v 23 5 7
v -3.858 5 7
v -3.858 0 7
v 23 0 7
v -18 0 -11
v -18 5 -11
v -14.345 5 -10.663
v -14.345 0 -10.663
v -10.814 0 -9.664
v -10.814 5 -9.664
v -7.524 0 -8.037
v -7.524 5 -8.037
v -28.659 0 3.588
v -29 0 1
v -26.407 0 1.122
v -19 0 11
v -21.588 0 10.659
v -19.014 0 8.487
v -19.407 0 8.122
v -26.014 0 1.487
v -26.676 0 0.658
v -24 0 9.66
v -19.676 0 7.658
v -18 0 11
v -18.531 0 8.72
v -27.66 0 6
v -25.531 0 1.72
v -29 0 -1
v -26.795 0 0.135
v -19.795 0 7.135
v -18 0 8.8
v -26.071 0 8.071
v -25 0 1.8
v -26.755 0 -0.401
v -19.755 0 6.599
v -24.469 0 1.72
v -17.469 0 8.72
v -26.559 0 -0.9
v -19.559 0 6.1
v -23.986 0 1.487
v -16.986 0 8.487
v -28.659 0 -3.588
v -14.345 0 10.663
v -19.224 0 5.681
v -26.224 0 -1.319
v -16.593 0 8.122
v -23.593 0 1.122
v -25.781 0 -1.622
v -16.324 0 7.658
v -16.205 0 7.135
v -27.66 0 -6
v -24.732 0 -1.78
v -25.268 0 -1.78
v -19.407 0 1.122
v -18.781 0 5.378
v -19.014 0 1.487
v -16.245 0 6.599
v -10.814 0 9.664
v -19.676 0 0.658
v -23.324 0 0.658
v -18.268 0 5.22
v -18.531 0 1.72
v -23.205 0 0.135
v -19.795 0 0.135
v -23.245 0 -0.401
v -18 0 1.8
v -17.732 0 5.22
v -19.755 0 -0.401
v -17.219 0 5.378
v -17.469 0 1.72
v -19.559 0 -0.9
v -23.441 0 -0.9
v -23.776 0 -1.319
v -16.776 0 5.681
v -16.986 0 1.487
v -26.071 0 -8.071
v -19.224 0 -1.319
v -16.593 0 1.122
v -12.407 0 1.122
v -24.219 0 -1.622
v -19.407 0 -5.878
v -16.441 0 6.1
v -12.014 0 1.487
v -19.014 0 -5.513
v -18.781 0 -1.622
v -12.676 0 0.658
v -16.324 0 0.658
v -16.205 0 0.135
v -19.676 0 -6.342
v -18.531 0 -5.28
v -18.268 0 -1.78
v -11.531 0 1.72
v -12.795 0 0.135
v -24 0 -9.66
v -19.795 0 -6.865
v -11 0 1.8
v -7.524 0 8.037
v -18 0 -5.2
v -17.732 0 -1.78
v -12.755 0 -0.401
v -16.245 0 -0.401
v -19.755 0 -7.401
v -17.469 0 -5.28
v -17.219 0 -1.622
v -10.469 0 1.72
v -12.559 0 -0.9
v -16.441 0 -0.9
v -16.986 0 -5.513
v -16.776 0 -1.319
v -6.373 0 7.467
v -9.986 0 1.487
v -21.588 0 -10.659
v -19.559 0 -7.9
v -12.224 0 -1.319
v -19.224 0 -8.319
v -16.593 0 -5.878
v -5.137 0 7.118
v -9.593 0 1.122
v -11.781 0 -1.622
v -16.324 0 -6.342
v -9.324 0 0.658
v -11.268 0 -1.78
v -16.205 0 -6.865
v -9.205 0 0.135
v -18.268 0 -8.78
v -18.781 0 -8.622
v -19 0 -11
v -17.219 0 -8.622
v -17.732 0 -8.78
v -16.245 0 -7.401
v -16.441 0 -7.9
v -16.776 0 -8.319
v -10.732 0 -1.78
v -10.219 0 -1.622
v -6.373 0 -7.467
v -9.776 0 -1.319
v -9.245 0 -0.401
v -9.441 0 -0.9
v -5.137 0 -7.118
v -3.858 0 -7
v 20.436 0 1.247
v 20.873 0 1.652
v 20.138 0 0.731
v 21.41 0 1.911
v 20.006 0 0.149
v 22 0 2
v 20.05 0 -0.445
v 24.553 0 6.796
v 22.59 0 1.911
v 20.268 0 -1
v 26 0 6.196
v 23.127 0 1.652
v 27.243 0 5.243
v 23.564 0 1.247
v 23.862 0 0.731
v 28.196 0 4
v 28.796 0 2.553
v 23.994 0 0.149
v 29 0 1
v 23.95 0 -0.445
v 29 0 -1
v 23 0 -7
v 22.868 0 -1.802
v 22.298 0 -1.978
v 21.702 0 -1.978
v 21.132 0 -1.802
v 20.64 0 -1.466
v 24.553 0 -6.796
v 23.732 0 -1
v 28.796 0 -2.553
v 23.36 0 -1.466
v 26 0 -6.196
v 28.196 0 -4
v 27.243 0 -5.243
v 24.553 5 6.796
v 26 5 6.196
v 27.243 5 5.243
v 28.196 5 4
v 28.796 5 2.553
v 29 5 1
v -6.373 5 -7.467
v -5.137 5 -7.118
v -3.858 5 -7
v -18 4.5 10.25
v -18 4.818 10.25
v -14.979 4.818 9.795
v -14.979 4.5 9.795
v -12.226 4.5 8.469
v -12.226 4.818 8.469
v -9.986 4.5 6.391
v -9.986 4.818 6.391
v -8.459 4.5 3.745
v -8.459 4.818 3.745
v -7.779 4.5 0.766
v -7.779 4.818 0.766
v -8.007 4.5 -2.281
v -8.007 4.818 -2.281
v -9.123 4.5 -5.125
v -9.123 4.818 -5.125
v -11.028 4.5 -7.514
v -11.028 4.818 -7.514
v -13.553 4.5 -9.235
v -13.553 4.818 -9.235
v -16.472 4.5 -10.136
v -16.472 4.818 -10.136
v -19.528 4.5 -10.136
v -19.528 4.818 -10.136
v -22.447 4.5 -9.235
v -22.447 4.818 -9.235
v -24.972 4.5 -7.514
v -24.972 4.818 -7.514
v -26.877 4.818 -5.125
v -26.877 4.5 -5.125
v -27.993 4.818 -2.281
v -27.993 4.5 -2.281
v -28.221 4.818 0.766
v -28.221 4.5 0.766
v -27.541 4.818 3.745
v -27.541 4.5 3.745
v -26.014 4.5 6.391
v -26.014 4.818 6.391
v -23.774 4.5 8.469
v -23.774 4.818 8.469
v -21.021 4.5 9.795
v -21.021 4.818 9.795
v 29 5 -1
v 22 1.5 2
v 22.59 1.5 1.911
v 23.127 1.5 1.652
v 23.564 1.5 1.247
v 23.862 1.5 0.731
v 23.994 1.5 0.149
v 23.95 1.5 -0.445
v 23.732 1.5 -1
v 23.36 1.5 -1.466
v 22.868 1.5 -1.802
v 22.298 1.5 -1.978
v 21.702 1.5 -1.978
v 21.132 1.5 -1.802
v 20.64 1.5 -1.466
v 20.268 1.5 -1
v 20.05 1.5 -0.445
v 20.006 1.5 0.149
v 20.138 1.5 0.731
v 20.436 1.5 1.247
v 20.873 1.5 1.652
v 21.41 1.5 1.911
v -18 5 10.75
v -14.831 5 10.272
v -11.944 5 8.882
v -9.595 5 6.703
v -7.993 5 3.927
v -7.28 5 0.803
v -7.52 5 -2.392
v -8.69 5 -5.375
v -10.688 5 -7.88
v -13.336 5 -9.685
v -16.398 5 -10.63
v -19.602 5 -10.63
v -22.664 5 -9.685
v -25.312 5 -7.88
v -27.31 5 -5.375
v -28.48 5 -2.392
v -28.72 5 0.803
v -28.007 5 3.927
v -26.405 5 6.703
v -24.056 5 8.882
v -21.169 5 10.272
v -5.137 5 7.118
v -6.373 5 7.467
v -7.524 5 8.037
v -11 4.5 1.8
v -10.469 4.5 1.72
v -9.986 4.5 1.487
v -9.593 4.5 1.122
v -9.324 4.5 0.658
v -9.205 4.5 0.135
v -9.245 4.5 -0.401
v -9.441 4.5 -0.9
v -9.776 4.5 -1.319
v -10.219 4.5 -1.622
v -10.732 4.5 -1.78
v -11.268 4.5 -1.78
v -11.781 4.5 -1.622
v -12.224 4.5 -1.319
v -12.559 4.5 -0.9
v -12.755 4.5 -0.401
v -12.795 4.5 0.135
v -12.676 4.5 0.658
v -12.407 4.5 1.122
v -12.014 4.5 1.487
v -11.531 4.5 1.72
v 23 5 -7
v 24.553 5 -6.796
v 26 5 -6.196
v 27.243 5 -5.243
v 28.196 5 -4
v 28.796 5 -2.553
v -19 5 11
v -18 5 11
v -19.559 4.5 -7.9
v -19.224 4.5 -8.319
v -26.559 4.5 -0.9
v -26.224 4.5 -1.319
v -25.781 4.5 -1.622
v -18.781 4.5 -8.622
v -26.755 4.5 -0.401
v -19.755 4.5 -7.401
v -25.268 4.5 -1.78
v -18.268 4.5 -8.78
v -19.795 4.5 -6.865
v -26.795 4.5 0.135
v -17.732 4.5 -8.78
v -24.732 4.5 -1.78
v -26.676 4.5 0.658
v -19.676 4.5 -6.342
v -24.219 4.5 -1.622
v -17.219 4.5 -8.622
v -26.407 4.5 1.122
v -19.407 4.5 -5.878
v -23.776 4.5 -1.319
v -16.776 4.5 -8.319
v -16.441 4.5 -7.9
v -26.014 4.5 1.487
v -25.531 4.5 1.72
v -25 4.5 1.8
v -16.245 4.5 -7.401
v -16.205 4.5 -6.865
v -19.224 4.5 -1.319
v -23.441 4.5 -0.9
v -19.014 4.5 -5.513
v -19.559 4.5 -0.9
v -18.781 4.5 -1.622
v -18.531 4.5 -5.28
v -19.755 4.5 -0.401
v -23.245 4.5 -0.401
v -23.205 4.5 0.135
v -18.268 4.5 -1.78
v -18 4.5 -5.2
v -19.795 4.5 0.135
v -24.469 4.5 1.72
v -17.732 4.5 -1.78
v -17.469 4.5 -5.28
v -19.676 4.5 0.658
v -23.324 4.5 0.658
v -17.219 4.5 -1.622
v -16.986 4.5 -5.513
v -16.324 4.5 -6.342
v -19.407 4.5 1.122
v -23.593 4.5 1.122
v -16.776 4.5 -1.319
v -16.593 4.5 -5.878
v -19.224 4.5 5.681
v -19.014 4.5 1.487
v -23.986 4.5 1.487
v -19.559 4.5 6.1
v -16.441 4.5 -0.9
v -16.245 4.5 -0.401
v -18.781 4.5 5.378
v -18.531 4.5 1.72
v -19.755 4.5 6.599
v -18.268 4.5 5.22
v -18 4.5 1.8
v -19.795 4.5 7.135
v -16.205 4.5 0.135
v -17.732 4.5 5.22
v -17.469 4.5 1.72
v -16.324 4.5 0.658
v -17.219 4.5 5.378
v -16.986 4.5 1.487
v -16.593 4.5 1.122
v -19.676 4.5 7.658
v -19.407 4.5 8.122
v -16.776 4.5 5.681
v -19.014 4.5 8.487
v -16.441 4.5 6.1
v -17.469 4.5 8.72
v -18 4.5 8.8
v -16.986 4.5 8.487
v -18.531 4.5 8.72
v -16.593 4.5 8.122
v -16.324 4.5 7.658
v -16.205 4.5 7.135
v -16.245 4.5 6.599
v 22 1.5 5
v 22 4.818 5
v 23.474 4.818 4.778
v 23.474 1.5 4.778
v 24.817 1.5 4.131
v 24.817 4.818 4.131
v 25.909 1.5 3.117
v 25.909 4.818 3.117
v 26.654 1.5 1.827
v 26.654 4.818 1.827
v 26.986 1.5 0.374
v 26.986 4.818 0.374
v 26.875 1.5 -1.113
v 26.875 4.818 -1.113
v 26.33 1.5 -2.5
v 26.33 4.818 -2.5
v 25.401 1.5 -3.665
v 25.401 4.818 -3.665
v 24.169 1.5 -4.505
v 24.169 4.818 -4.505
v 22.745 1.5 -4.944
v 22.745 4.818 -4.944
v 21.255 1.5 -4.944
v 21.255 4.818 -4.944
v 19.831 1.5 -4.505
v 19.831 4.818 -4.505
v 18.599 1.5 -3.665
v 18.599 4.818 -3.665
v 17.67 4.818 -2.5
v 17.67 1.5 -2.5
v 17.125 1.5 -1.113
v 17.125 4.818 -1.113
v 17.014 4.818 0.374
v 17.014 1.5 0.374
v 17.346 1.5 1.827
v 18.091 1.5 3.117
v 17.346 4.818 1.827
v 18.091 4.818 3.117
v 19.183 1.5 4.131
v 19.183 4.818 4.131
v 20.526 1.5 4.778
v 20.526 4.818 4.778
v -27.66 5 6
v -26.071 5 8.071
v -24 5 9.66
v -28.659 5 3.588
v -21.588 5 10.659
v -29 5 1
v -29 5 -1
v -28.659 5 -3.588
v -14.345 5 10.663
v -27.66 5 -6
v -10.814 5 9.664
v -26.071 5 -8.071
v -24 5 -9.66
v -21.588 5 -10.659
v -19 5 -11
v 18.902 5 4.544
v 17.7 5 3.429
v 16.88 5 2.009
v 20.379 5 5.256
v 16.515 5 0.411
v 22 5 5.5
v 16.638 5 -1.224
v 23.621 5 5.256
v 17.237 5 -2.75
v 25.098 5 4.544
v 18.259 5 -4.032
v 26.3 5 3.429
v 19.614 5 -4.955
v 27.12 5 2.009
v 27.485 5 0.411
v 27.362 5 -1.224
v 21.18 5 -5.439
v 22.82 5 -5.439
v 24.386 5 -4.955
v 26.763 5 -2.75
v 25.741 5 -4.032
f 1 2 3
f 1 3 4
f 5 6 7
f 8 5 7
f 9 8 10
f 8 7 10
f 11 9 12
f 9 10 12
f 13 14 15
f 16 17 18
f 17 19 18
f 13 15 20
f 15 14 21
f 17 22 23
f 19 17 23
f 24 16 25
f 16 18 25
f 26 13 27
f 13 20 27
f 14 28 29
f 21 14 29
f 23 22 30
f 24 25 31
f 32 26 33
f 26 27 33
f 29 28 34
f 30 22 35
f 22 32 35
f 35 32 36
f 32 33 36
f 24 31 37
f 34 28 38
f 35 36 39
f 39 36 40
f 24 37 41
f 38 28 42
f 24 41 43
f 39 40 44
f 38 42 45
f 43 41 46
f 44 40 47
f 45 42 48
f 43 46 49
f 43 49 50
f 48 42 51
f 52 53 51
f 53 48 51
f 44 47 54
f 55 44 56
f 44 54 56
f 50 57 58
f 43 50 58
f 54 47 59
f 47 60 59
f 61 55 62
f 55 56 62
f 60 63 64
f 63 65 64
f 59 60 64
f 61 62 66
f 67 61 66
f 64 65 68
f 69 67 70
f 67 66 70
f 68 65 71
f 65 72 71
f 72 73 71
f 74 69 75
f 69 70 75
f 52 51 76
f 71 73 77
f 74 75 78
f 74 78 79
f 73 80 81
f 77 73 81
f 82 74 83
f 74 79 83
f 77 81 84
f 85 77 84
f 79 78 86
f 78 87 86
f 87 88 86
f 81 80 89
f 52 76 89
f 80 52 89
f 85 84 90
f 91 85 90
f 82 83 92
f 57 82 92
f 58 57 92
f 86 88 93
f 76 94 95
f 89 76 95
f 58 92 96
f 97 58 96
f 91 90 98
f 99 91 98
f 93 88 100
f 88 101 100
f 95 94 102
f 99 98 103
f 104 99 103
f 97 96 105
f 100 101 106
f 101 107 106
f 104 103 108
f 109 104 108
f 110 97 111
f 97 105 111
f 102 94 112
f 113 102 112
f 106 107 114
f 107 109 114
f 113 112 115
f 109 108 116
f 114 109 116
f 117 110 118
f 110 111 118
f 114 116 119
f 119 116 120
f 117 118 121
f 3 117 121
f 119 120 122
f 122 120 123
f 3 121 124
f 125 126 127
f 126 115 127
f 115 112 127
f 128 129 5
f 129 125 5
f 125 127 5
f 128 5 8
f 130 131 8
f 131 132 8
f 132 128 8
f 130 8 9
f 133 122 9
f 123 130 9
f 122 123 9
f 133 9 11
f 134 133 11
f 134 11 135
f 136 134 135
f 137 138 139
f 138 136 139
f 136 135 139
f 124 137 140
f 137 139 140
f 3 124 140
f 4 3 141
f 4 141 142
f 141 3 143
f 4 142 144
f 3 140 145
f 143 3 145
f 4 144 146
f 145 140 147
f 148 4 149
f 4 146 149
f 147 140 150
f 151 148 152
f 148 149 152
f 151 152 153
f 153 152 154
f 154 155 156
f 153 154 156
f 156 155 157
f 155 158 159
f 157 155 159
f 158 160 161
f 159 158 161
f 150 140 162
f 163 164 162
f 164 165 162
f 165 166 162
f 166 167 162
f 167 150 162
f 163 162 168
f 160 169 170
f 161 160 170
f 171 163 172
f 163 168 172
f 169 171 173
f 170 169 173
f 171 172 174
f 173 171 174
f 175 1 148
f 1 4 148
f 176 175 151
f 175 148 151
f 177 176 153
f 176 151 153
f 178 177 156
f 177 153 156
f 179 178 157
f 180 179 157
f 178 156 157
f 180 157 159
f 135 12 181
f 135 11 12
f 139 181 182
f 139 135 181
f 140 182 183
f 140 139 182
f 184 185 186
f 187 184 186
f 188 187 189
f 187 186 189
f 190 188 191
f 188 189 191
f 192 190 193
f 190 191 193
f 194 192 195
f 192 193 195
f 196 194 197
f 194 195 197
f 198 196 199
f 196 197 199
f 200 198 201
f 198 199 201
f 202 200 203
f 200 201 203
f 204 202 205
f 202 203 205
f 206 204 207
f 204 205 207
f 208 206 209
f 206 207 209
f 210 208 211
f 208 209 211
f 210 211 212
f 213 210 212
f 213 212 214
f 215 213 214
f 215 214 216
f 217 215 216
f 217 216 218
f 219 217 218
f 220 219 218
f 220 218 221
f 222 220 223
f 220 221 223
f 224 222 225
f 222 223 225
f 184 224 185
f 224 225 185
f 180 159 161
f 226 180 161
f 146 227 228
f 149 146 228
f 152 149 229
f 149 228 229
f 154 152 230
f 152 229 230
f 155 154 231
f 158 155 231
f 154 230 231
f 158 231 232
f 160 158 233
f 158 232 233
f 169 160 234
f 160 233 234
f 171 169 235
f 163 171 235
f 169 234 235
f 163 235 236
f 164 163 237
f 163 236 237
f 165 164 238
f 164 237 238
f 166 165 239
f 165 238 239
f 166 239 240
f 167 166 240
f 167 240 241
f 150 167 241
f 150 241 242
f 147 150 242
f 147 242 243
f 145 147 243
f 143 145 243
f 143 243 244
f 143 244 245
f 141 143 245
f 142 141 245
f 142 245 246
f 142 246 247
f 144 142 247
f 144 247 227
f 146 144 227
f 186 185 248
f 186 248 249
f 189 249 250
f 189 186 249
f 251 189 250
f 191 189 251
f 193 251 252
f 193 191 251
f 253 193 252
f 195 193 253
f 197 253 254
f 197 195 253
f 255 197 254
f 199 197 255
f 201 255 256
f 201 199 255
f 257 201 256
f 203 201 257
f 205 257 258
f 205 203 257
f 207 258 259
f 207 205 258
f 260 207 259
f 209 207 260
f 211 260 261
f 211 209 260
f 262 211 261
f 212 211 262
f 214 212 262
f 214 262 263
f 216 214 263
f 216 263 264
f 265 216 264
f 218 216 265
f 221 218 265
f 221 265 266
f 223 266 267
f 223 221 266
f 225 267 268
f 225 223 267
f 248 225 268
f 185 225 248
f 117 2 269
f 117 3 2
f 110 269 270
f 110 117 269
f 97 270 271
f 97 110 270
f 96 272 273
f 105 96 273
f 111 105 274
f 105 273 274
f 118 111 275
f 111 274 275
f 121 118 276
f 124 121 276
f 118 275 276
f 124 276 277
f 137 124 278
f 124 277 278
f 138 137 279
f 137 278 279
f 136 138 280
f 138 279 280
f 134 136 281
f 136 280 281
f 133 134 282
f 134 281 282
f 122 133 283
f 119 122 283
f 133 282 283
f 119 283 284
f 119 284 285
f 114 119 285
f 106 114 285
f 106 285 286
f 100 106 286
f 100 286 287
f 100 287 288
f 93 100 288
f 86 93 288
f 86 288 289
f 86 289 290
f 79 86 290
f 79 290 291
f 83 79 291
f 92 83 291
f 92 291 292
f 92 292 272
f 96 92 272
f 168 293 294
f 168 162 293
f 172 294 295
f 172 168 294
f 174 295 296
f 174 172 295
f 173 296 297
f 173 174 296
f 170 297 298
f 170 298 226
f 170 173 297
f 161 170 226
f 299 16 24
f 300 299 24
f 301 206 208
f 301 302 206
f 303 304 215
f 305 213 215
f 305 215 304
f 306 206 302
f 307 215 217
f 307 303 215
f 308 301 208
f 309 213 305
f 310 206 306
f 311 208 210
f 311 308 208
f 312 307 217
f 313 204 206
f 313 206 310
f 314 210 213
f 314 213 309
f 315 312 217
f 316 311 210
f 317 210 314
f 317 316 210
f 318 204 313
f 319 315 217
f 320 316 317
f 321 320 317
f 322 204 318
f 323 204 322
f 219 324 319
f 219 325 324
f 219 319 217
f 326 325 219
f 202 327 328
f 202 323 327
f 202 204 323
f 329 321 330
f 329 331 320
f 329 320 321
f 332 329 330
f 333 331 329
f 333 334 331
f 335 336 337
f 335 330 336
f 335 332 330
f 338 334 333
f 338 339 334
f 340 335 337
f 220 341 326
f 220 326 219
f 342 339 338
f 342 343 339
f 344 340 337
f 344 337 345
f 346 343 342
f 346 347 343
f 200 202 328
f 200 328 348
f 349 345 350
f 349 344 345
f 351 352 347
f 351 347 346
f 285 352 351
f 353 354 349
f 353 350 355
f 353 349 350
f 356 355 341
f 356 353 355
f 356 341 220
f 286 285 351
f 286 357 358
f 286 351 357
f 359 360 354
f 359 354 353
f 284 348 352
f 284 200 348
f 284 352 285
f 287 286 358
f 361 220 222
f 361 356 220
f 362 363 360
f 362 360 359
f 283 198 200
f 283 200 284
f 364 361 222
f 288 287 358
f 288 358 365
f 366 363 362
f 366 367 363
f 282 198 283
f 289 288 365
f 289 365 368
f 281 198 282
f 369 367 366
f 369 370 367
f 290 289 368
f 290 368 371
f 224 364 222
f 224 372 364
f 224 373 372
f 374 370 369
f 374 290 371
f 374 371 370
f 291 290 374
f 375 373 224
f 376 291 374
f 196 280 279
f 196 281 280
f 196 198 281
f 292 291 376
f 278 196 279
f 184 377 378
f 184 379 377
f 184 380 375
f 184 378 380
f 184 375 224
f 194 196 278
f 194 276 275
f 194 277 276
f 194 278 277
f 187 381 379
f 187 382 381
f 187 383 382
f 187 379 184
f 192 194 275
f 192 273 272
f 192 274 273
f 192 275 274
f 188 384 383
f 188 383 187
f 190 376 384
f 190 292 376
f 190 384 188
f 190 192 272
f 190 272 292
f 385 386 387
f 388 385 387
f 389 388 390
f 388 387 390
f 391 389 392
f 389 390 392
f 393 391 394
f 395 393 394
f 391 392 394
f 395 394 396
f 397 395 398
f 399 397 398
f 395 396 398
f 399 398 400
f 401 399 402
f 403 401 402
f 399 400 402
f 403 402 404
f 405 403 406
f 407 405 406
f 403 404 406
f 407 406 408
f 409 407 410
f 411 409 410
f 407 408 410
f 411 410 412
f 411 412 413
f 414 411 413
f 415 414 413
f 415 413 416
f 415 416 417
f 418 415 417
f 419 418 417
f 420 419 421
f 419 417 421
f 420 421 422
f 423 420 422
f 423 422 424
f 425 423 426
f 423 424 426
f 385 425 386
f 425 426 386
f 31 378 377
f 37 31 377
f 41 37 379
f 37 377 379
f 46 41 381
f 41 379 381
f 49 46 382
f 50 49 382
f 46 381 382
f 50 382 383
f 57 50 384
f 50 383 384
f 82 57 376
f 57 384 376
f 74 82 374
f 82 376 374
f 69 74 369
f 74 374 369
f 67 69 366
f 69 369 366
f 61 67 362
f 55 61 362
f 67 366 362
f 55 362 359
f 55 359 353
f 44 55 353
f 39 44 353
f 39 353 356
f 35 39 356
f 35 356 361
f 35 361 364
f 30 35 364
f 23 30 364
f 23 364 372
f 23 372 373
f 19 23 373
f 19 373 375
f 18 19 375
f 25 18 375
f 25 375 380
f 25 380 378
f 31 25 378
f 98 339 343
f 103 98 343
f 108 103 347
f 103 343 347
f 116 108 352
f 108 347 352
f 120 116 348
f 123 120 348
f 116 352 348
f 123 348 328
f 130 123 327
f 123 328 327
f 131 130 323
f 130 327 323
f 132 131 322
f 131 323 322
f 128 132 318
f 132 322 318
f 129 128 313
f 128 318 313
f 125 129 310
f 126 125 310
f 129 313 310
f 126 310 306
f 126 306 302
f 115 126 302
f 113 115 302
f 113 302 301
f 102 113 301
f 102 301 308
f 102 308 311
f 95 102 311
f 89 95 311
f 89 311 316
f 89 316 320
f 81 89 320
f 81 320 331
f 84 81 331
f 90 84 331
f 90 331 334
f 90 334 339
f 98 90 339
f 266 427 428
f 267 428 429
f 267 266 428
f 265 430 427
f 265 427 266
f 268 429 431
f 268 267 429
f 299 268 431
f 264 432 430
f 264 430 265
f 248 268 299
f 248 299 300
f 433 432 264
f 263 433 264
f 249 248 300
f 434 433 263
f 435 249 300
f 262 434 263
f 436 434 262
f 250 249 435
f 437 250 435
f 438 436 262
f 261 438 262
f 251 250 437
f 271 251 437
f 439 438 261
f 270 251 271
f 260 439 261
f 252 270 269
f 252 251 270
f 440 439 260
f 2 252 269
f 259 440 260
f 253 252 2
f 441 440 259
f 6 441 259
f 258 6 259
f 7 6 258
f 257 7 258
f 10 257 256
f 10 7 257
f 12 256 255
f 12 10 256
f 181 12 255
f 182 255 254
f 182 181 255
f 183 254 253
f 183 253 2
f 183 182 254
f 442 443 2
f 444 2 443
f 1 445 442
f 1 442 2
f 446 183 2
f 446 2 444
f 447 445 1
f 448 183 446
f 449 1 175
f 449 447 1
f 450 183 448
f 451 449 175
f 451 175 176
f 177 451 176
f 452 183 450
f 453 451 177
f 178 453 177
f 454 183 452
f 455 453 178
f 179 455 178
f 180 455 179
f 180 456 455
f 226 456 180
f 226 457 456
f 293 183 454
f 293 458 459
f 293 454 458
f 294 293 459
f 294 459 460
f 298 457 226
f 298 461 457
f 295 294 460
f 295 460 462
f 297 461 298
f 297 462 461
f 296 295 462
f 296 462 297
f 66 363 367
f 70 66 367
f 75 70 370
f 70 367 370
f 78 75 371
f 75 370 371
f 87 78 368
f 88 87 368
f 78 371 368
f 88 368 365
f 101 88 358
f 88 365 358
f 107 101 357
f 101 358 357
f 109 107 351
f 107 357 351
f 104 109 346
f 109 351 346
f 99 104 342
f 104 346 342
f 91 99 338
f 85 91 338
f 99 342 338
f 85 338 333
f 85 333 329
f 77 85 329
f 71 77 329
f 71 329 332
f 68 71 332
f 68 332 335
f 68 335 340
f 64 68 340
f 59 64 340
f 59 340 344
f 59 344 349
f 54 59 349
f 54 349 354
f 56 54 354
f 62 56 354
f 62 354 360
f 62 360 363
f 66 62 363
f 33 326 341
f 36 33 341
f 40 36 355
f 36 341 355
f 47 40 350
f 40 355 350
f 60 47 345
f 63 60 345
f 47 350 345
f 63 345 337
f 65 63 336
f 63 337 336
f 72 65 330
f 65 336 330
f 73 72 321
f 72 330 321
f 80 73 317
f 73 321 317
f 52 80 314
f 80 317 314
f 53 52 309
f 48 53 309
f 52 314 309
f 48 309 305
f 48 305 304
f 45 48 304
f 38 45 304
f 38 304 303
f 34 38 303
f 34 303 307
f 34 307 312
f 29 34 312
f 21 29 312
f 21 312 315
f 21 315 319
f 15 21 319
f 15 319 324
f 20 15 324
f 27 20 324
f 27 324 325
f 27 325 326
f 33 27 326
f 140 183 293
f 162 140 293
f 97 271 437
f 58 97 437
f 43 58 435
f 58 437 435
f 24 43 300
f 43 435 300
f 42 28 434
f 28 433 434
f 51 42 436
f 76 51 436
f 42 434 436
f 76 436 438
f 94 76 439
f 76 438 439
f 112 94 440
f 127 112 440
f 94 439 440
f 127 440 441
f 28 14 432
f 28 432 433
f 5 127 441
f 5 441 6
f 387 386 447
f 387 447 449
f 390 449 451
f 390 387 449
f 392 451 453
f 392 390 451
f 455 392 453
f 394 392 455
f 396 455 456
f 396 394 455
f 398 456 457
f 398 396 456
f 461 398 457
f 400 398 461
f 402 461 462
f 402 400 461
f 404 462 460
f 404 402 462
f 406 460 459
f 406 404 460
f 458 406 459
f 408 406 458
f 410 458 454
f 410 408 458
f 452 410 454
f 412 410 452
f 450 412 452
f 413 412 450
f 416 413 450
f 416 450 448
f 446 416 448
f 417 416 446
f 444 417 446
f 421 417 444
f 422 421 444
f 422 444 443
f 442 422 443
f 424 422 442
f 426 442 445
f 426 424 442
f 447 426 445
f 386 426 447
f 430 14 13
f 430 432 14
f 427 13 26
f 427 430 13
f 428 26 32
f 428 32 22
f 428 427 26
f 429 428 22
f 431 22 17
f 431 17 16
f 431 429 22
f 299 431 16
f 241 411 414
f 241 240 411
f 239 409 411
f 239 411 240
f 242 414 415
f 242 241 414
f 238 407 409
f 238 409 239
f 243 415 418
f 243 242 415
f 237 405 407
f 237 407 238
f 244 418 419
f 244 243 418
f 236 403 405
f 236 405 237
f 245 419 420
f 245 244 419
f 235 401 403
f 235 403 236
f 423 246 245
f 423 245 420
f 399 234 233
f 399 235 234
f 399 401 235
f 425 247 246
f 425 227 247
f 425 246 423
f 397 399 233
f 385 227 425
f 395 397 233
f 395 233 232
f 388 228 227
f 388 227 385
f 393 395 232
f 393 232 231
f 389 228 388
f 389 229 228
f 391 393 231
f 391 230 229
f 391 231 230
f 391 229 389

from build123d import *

# Parameters (mm, degrees)
SKETCH_2_W          = 58
SKETCH_2_H          = 22
EXTRUDE_1_DEPTH     = 5
SKETCH_4_R          = 10.25
SKETCH_4_R_2        = 1.8
CUT_EXTRUDE_1_DEPTH = 0.5
SKETCH_4_3_R        = 1.8
CUT_EXTRUDE_2_DEPTH = 10
SKETCH_5_W          = 35
SKETCH_5_H          = 4
CUT_EXTRUDE_3_DEPTH = 10
SKETCH_6_R          = 5
CUT_EXTRUDE_4_DEPTH = 3.5
CHAMFER_1_SIZE      = 0.5
CHAMFER_1_SIZE2     = 0.181985117
SKETCH_7_R          = 2
CUT_EXTRUDE_5_DEPTH = 3.5
FILLET_2_R          = 10
FILLET_3_R          = 6
FILLET_4_R          = 20
FILLET_5_R          = 7


with BuildPart() as part:
    # Эскиз2 → Бобышка-Вытянуть1 (new body)
    with BuildSketch(Plane(origin=(0, 0, 0), x_dir=(1, 0, 0), z_dir=(0, 1, 0))):
        Rectangle(SKETCH_2_W, SKETCH_2_H)
    extrude(amount=EXTRUDE_1_DEPTH)

    # Эскиз4 → Вырез-Вытянуть1 (cut)
    with BuildSketch(Plane(origin=(0, 5, 0), x_dir=(1, 0, 0), z_dir=(0, 1, 0))):
        with Locations(Location((-18, 0, 0), (0, 0, 270))):
            Circle(SKETCH_4_R)
        with Locations(Location((-18, 7, 0), (0, 0, 270))):
            Circle(SKETCH_4_R_2, mode=Mode.SUBTRACT)
        with Locations(Location((-18, -7, 0), (0, 0, 270))):
            Circle(SKETCH_4_R_2, mode=Mode.SUBTRACT)
        with Locations(Location((-25, 0, 0), (0, 0, 270))):
            Circle(SKETCH_4_R_2, mode=Mode.SUBTRACT)
        with Locations(Location((-11, 0, 0), (0, 0, 270))):
            Circle(SKETCH_4_R_2, mode=Mode.SUBTRACT)
        with Locations(Location((-18, 0, 0), (0, 0, 270))):
            Circle(SKETCH_4_R_2, mode=Mode.SUBTRACT)
    extrude(amount=-CUT_EXTRUDE_1_DEPTH, mode=Mode.SUBTRACT)

    # Эскиз4<3> → Вырез-Вытянуть2 (cut)
    with BuildSketch(Plane(origin=(0, 5, 0), x_dir=(1, 0, 0), z_dir=(0, 1, 0))):
        with Locations(Location((-18, 7, 0), (0, 0, 270))):
            Circle(SKETCH_4_3_R)
        with Locations(Location((-11, 0, 0), (0, 0, 270))):
            Circle(SKETCH_4_3_R)
        with Locations(Location((-18, -7, 0), (0, 0, 270))):
            Circle(SKETCH_4_3_R)
        with Locations(Location((-25, 0, 0), (0, 0, 270))):
            Circle(SKETCH_4_3_R)
        with Locations(Location((-18, 0, 0), (0, 0, 270))):
            Circle(SKETCH_4_3_R)
    extrude(amount=-CUT_EXTRUDE_2_DEPTH, mode=Mode.SUBTRACT)

    # Эскиз5 → Вырез-Вытянуть3 (cut)
    with BuildSketch(Plane(origin=(0, 5, 0), x_dir=(1, 0, 0), z_dir=(0, 1, 0))):
        with Locations((11.5, 9)):
            Rectangle(SKETCH_5_W, SKETCH_5_H)
        with Locations((11.5, -9)):
            Rectangle(SKETCH_5_W, SKETCH_5_H)
    extrude(amount=-CUT_EXTRUDE_3_DEPTH, mode=Mode.SUBTRACT)

    # Эскиз6 → Вырез-Вытянуть4 (cut)
    with BuildSketch(Plane(origin=(0, 5, 0), x_dir=(1, 0, 0), z_dir=(0, 1, 0))):
        with Locations(Location((22, 0, 0), (0, 0, 270))):
            Circle(SKETCH_6_R)
    extrude(amount=-CUT_EXTRUDE_4_DEPTH, mode=Mode.SUBTRACT)

    # Фаска1
    chamfer_1_edges = [part.edges().sort_by_distance(p)[0] for p in [
        (22, 5, -5),
        (-18, 5, -10.25),
    ]]
    chamfer_1_side = [part.faces().sort_by_distance(p)[0] for p in [
        (1.690967292, 5, 0),
    ]]
    chamfer(chamfer_1_edges, length=CHAMFER_1_SIZE, length2=CHAMFER_1_SIZE2, reference=chamfer_1_side[0])

    # Эскиз7 → Вырез-Вытянуть5 (cut)
    with BuildSketch(Plane(origin=(0, 1.5, 0), x_dir=(1, 0, 0), z_dir=(0, 1, 0))):
        with Locations(Location((22, 0, 0), (0, 0, 270))):
            Circle(SKETCH_7_R)
    extrude(amount=-CUT_EXTRUDE_5_DEPTH, mode=Mode.SUBTRACT)

    # Скругление2
    fillet_2_edges = [part.edges().sort_by_distance(p)[0] for p in [
        (-29, 2.5, 11),
        (-29, 2.5, -11),
    ]]
    fillet(fillet_2_edges, radius=FILLET_2_R)

    # Скругление3
    fillet_3_edges = [part.edges().sort_by_distance(p)[0] for p in [
        (29, 2.5, -7),
        (29, 2.5, 7),
    ]]
    fillet(fillet_3_edges, radius=FILLET_3_R)

    # Скругление4
    # the kernel refuses this fillet: 20 mm, written as the material it takes off along each edge
    with BuildSketch(Plane(origin=(-6, 35, -11), x_dir=(0, 0, 1), z_dir=(0, -1, 0))) as fillet_4_piece_1:
        with BuildLine():
            CenterArc((20, 12), FILLET_4_R, 180, 36.869897646)
            Line((0, 12), (-0.4, 12))
            Line((-0.4, 12), (-0.4, 0))
            Line((-0.4, 0), (0, -0.4))
            ThreePointArc((0, -0.4), (2, -0.4), (3.68, -0.24))
            Line((3.68, -0.24), (4, 0))
        make_face()
    extrude(amount=65, mode=Mode.SUBTRACT)
    with BuildSketch(Plane(origin=(-6, 35, 11), x_dir=(0, 0, -1), z_dir=(0, -1, 0))) as fillet_4_piece_2:
        with BuildLine():
            CenterArc((20, -12), FILLET_4_R, 143.130102354, 36.869897646)
            Line((0, -12), (-0.4, -12))
            Line((-0.4, -12), (-0.4, 0))
            Line((-0.4, 0), (0, 0.4))
            ThreePointArc((0, 0.4), (2, 0.4), (3.68, 0.24))
            Line((3.68, 0.24), (4, 0))
        make_face()
    extrude(amount=65, mode=Mode.SUBTRACT)

    # Скругление5
    fillet_5_edges = [part.edges().sort_by_distance(p)[0] for p in [
        (-6, 2.5, -7),
        (-6, 2.5, 7),
    ]]
    fillet(fillet_5_edges, radius=FILLET_5_R)


solid = part.part
